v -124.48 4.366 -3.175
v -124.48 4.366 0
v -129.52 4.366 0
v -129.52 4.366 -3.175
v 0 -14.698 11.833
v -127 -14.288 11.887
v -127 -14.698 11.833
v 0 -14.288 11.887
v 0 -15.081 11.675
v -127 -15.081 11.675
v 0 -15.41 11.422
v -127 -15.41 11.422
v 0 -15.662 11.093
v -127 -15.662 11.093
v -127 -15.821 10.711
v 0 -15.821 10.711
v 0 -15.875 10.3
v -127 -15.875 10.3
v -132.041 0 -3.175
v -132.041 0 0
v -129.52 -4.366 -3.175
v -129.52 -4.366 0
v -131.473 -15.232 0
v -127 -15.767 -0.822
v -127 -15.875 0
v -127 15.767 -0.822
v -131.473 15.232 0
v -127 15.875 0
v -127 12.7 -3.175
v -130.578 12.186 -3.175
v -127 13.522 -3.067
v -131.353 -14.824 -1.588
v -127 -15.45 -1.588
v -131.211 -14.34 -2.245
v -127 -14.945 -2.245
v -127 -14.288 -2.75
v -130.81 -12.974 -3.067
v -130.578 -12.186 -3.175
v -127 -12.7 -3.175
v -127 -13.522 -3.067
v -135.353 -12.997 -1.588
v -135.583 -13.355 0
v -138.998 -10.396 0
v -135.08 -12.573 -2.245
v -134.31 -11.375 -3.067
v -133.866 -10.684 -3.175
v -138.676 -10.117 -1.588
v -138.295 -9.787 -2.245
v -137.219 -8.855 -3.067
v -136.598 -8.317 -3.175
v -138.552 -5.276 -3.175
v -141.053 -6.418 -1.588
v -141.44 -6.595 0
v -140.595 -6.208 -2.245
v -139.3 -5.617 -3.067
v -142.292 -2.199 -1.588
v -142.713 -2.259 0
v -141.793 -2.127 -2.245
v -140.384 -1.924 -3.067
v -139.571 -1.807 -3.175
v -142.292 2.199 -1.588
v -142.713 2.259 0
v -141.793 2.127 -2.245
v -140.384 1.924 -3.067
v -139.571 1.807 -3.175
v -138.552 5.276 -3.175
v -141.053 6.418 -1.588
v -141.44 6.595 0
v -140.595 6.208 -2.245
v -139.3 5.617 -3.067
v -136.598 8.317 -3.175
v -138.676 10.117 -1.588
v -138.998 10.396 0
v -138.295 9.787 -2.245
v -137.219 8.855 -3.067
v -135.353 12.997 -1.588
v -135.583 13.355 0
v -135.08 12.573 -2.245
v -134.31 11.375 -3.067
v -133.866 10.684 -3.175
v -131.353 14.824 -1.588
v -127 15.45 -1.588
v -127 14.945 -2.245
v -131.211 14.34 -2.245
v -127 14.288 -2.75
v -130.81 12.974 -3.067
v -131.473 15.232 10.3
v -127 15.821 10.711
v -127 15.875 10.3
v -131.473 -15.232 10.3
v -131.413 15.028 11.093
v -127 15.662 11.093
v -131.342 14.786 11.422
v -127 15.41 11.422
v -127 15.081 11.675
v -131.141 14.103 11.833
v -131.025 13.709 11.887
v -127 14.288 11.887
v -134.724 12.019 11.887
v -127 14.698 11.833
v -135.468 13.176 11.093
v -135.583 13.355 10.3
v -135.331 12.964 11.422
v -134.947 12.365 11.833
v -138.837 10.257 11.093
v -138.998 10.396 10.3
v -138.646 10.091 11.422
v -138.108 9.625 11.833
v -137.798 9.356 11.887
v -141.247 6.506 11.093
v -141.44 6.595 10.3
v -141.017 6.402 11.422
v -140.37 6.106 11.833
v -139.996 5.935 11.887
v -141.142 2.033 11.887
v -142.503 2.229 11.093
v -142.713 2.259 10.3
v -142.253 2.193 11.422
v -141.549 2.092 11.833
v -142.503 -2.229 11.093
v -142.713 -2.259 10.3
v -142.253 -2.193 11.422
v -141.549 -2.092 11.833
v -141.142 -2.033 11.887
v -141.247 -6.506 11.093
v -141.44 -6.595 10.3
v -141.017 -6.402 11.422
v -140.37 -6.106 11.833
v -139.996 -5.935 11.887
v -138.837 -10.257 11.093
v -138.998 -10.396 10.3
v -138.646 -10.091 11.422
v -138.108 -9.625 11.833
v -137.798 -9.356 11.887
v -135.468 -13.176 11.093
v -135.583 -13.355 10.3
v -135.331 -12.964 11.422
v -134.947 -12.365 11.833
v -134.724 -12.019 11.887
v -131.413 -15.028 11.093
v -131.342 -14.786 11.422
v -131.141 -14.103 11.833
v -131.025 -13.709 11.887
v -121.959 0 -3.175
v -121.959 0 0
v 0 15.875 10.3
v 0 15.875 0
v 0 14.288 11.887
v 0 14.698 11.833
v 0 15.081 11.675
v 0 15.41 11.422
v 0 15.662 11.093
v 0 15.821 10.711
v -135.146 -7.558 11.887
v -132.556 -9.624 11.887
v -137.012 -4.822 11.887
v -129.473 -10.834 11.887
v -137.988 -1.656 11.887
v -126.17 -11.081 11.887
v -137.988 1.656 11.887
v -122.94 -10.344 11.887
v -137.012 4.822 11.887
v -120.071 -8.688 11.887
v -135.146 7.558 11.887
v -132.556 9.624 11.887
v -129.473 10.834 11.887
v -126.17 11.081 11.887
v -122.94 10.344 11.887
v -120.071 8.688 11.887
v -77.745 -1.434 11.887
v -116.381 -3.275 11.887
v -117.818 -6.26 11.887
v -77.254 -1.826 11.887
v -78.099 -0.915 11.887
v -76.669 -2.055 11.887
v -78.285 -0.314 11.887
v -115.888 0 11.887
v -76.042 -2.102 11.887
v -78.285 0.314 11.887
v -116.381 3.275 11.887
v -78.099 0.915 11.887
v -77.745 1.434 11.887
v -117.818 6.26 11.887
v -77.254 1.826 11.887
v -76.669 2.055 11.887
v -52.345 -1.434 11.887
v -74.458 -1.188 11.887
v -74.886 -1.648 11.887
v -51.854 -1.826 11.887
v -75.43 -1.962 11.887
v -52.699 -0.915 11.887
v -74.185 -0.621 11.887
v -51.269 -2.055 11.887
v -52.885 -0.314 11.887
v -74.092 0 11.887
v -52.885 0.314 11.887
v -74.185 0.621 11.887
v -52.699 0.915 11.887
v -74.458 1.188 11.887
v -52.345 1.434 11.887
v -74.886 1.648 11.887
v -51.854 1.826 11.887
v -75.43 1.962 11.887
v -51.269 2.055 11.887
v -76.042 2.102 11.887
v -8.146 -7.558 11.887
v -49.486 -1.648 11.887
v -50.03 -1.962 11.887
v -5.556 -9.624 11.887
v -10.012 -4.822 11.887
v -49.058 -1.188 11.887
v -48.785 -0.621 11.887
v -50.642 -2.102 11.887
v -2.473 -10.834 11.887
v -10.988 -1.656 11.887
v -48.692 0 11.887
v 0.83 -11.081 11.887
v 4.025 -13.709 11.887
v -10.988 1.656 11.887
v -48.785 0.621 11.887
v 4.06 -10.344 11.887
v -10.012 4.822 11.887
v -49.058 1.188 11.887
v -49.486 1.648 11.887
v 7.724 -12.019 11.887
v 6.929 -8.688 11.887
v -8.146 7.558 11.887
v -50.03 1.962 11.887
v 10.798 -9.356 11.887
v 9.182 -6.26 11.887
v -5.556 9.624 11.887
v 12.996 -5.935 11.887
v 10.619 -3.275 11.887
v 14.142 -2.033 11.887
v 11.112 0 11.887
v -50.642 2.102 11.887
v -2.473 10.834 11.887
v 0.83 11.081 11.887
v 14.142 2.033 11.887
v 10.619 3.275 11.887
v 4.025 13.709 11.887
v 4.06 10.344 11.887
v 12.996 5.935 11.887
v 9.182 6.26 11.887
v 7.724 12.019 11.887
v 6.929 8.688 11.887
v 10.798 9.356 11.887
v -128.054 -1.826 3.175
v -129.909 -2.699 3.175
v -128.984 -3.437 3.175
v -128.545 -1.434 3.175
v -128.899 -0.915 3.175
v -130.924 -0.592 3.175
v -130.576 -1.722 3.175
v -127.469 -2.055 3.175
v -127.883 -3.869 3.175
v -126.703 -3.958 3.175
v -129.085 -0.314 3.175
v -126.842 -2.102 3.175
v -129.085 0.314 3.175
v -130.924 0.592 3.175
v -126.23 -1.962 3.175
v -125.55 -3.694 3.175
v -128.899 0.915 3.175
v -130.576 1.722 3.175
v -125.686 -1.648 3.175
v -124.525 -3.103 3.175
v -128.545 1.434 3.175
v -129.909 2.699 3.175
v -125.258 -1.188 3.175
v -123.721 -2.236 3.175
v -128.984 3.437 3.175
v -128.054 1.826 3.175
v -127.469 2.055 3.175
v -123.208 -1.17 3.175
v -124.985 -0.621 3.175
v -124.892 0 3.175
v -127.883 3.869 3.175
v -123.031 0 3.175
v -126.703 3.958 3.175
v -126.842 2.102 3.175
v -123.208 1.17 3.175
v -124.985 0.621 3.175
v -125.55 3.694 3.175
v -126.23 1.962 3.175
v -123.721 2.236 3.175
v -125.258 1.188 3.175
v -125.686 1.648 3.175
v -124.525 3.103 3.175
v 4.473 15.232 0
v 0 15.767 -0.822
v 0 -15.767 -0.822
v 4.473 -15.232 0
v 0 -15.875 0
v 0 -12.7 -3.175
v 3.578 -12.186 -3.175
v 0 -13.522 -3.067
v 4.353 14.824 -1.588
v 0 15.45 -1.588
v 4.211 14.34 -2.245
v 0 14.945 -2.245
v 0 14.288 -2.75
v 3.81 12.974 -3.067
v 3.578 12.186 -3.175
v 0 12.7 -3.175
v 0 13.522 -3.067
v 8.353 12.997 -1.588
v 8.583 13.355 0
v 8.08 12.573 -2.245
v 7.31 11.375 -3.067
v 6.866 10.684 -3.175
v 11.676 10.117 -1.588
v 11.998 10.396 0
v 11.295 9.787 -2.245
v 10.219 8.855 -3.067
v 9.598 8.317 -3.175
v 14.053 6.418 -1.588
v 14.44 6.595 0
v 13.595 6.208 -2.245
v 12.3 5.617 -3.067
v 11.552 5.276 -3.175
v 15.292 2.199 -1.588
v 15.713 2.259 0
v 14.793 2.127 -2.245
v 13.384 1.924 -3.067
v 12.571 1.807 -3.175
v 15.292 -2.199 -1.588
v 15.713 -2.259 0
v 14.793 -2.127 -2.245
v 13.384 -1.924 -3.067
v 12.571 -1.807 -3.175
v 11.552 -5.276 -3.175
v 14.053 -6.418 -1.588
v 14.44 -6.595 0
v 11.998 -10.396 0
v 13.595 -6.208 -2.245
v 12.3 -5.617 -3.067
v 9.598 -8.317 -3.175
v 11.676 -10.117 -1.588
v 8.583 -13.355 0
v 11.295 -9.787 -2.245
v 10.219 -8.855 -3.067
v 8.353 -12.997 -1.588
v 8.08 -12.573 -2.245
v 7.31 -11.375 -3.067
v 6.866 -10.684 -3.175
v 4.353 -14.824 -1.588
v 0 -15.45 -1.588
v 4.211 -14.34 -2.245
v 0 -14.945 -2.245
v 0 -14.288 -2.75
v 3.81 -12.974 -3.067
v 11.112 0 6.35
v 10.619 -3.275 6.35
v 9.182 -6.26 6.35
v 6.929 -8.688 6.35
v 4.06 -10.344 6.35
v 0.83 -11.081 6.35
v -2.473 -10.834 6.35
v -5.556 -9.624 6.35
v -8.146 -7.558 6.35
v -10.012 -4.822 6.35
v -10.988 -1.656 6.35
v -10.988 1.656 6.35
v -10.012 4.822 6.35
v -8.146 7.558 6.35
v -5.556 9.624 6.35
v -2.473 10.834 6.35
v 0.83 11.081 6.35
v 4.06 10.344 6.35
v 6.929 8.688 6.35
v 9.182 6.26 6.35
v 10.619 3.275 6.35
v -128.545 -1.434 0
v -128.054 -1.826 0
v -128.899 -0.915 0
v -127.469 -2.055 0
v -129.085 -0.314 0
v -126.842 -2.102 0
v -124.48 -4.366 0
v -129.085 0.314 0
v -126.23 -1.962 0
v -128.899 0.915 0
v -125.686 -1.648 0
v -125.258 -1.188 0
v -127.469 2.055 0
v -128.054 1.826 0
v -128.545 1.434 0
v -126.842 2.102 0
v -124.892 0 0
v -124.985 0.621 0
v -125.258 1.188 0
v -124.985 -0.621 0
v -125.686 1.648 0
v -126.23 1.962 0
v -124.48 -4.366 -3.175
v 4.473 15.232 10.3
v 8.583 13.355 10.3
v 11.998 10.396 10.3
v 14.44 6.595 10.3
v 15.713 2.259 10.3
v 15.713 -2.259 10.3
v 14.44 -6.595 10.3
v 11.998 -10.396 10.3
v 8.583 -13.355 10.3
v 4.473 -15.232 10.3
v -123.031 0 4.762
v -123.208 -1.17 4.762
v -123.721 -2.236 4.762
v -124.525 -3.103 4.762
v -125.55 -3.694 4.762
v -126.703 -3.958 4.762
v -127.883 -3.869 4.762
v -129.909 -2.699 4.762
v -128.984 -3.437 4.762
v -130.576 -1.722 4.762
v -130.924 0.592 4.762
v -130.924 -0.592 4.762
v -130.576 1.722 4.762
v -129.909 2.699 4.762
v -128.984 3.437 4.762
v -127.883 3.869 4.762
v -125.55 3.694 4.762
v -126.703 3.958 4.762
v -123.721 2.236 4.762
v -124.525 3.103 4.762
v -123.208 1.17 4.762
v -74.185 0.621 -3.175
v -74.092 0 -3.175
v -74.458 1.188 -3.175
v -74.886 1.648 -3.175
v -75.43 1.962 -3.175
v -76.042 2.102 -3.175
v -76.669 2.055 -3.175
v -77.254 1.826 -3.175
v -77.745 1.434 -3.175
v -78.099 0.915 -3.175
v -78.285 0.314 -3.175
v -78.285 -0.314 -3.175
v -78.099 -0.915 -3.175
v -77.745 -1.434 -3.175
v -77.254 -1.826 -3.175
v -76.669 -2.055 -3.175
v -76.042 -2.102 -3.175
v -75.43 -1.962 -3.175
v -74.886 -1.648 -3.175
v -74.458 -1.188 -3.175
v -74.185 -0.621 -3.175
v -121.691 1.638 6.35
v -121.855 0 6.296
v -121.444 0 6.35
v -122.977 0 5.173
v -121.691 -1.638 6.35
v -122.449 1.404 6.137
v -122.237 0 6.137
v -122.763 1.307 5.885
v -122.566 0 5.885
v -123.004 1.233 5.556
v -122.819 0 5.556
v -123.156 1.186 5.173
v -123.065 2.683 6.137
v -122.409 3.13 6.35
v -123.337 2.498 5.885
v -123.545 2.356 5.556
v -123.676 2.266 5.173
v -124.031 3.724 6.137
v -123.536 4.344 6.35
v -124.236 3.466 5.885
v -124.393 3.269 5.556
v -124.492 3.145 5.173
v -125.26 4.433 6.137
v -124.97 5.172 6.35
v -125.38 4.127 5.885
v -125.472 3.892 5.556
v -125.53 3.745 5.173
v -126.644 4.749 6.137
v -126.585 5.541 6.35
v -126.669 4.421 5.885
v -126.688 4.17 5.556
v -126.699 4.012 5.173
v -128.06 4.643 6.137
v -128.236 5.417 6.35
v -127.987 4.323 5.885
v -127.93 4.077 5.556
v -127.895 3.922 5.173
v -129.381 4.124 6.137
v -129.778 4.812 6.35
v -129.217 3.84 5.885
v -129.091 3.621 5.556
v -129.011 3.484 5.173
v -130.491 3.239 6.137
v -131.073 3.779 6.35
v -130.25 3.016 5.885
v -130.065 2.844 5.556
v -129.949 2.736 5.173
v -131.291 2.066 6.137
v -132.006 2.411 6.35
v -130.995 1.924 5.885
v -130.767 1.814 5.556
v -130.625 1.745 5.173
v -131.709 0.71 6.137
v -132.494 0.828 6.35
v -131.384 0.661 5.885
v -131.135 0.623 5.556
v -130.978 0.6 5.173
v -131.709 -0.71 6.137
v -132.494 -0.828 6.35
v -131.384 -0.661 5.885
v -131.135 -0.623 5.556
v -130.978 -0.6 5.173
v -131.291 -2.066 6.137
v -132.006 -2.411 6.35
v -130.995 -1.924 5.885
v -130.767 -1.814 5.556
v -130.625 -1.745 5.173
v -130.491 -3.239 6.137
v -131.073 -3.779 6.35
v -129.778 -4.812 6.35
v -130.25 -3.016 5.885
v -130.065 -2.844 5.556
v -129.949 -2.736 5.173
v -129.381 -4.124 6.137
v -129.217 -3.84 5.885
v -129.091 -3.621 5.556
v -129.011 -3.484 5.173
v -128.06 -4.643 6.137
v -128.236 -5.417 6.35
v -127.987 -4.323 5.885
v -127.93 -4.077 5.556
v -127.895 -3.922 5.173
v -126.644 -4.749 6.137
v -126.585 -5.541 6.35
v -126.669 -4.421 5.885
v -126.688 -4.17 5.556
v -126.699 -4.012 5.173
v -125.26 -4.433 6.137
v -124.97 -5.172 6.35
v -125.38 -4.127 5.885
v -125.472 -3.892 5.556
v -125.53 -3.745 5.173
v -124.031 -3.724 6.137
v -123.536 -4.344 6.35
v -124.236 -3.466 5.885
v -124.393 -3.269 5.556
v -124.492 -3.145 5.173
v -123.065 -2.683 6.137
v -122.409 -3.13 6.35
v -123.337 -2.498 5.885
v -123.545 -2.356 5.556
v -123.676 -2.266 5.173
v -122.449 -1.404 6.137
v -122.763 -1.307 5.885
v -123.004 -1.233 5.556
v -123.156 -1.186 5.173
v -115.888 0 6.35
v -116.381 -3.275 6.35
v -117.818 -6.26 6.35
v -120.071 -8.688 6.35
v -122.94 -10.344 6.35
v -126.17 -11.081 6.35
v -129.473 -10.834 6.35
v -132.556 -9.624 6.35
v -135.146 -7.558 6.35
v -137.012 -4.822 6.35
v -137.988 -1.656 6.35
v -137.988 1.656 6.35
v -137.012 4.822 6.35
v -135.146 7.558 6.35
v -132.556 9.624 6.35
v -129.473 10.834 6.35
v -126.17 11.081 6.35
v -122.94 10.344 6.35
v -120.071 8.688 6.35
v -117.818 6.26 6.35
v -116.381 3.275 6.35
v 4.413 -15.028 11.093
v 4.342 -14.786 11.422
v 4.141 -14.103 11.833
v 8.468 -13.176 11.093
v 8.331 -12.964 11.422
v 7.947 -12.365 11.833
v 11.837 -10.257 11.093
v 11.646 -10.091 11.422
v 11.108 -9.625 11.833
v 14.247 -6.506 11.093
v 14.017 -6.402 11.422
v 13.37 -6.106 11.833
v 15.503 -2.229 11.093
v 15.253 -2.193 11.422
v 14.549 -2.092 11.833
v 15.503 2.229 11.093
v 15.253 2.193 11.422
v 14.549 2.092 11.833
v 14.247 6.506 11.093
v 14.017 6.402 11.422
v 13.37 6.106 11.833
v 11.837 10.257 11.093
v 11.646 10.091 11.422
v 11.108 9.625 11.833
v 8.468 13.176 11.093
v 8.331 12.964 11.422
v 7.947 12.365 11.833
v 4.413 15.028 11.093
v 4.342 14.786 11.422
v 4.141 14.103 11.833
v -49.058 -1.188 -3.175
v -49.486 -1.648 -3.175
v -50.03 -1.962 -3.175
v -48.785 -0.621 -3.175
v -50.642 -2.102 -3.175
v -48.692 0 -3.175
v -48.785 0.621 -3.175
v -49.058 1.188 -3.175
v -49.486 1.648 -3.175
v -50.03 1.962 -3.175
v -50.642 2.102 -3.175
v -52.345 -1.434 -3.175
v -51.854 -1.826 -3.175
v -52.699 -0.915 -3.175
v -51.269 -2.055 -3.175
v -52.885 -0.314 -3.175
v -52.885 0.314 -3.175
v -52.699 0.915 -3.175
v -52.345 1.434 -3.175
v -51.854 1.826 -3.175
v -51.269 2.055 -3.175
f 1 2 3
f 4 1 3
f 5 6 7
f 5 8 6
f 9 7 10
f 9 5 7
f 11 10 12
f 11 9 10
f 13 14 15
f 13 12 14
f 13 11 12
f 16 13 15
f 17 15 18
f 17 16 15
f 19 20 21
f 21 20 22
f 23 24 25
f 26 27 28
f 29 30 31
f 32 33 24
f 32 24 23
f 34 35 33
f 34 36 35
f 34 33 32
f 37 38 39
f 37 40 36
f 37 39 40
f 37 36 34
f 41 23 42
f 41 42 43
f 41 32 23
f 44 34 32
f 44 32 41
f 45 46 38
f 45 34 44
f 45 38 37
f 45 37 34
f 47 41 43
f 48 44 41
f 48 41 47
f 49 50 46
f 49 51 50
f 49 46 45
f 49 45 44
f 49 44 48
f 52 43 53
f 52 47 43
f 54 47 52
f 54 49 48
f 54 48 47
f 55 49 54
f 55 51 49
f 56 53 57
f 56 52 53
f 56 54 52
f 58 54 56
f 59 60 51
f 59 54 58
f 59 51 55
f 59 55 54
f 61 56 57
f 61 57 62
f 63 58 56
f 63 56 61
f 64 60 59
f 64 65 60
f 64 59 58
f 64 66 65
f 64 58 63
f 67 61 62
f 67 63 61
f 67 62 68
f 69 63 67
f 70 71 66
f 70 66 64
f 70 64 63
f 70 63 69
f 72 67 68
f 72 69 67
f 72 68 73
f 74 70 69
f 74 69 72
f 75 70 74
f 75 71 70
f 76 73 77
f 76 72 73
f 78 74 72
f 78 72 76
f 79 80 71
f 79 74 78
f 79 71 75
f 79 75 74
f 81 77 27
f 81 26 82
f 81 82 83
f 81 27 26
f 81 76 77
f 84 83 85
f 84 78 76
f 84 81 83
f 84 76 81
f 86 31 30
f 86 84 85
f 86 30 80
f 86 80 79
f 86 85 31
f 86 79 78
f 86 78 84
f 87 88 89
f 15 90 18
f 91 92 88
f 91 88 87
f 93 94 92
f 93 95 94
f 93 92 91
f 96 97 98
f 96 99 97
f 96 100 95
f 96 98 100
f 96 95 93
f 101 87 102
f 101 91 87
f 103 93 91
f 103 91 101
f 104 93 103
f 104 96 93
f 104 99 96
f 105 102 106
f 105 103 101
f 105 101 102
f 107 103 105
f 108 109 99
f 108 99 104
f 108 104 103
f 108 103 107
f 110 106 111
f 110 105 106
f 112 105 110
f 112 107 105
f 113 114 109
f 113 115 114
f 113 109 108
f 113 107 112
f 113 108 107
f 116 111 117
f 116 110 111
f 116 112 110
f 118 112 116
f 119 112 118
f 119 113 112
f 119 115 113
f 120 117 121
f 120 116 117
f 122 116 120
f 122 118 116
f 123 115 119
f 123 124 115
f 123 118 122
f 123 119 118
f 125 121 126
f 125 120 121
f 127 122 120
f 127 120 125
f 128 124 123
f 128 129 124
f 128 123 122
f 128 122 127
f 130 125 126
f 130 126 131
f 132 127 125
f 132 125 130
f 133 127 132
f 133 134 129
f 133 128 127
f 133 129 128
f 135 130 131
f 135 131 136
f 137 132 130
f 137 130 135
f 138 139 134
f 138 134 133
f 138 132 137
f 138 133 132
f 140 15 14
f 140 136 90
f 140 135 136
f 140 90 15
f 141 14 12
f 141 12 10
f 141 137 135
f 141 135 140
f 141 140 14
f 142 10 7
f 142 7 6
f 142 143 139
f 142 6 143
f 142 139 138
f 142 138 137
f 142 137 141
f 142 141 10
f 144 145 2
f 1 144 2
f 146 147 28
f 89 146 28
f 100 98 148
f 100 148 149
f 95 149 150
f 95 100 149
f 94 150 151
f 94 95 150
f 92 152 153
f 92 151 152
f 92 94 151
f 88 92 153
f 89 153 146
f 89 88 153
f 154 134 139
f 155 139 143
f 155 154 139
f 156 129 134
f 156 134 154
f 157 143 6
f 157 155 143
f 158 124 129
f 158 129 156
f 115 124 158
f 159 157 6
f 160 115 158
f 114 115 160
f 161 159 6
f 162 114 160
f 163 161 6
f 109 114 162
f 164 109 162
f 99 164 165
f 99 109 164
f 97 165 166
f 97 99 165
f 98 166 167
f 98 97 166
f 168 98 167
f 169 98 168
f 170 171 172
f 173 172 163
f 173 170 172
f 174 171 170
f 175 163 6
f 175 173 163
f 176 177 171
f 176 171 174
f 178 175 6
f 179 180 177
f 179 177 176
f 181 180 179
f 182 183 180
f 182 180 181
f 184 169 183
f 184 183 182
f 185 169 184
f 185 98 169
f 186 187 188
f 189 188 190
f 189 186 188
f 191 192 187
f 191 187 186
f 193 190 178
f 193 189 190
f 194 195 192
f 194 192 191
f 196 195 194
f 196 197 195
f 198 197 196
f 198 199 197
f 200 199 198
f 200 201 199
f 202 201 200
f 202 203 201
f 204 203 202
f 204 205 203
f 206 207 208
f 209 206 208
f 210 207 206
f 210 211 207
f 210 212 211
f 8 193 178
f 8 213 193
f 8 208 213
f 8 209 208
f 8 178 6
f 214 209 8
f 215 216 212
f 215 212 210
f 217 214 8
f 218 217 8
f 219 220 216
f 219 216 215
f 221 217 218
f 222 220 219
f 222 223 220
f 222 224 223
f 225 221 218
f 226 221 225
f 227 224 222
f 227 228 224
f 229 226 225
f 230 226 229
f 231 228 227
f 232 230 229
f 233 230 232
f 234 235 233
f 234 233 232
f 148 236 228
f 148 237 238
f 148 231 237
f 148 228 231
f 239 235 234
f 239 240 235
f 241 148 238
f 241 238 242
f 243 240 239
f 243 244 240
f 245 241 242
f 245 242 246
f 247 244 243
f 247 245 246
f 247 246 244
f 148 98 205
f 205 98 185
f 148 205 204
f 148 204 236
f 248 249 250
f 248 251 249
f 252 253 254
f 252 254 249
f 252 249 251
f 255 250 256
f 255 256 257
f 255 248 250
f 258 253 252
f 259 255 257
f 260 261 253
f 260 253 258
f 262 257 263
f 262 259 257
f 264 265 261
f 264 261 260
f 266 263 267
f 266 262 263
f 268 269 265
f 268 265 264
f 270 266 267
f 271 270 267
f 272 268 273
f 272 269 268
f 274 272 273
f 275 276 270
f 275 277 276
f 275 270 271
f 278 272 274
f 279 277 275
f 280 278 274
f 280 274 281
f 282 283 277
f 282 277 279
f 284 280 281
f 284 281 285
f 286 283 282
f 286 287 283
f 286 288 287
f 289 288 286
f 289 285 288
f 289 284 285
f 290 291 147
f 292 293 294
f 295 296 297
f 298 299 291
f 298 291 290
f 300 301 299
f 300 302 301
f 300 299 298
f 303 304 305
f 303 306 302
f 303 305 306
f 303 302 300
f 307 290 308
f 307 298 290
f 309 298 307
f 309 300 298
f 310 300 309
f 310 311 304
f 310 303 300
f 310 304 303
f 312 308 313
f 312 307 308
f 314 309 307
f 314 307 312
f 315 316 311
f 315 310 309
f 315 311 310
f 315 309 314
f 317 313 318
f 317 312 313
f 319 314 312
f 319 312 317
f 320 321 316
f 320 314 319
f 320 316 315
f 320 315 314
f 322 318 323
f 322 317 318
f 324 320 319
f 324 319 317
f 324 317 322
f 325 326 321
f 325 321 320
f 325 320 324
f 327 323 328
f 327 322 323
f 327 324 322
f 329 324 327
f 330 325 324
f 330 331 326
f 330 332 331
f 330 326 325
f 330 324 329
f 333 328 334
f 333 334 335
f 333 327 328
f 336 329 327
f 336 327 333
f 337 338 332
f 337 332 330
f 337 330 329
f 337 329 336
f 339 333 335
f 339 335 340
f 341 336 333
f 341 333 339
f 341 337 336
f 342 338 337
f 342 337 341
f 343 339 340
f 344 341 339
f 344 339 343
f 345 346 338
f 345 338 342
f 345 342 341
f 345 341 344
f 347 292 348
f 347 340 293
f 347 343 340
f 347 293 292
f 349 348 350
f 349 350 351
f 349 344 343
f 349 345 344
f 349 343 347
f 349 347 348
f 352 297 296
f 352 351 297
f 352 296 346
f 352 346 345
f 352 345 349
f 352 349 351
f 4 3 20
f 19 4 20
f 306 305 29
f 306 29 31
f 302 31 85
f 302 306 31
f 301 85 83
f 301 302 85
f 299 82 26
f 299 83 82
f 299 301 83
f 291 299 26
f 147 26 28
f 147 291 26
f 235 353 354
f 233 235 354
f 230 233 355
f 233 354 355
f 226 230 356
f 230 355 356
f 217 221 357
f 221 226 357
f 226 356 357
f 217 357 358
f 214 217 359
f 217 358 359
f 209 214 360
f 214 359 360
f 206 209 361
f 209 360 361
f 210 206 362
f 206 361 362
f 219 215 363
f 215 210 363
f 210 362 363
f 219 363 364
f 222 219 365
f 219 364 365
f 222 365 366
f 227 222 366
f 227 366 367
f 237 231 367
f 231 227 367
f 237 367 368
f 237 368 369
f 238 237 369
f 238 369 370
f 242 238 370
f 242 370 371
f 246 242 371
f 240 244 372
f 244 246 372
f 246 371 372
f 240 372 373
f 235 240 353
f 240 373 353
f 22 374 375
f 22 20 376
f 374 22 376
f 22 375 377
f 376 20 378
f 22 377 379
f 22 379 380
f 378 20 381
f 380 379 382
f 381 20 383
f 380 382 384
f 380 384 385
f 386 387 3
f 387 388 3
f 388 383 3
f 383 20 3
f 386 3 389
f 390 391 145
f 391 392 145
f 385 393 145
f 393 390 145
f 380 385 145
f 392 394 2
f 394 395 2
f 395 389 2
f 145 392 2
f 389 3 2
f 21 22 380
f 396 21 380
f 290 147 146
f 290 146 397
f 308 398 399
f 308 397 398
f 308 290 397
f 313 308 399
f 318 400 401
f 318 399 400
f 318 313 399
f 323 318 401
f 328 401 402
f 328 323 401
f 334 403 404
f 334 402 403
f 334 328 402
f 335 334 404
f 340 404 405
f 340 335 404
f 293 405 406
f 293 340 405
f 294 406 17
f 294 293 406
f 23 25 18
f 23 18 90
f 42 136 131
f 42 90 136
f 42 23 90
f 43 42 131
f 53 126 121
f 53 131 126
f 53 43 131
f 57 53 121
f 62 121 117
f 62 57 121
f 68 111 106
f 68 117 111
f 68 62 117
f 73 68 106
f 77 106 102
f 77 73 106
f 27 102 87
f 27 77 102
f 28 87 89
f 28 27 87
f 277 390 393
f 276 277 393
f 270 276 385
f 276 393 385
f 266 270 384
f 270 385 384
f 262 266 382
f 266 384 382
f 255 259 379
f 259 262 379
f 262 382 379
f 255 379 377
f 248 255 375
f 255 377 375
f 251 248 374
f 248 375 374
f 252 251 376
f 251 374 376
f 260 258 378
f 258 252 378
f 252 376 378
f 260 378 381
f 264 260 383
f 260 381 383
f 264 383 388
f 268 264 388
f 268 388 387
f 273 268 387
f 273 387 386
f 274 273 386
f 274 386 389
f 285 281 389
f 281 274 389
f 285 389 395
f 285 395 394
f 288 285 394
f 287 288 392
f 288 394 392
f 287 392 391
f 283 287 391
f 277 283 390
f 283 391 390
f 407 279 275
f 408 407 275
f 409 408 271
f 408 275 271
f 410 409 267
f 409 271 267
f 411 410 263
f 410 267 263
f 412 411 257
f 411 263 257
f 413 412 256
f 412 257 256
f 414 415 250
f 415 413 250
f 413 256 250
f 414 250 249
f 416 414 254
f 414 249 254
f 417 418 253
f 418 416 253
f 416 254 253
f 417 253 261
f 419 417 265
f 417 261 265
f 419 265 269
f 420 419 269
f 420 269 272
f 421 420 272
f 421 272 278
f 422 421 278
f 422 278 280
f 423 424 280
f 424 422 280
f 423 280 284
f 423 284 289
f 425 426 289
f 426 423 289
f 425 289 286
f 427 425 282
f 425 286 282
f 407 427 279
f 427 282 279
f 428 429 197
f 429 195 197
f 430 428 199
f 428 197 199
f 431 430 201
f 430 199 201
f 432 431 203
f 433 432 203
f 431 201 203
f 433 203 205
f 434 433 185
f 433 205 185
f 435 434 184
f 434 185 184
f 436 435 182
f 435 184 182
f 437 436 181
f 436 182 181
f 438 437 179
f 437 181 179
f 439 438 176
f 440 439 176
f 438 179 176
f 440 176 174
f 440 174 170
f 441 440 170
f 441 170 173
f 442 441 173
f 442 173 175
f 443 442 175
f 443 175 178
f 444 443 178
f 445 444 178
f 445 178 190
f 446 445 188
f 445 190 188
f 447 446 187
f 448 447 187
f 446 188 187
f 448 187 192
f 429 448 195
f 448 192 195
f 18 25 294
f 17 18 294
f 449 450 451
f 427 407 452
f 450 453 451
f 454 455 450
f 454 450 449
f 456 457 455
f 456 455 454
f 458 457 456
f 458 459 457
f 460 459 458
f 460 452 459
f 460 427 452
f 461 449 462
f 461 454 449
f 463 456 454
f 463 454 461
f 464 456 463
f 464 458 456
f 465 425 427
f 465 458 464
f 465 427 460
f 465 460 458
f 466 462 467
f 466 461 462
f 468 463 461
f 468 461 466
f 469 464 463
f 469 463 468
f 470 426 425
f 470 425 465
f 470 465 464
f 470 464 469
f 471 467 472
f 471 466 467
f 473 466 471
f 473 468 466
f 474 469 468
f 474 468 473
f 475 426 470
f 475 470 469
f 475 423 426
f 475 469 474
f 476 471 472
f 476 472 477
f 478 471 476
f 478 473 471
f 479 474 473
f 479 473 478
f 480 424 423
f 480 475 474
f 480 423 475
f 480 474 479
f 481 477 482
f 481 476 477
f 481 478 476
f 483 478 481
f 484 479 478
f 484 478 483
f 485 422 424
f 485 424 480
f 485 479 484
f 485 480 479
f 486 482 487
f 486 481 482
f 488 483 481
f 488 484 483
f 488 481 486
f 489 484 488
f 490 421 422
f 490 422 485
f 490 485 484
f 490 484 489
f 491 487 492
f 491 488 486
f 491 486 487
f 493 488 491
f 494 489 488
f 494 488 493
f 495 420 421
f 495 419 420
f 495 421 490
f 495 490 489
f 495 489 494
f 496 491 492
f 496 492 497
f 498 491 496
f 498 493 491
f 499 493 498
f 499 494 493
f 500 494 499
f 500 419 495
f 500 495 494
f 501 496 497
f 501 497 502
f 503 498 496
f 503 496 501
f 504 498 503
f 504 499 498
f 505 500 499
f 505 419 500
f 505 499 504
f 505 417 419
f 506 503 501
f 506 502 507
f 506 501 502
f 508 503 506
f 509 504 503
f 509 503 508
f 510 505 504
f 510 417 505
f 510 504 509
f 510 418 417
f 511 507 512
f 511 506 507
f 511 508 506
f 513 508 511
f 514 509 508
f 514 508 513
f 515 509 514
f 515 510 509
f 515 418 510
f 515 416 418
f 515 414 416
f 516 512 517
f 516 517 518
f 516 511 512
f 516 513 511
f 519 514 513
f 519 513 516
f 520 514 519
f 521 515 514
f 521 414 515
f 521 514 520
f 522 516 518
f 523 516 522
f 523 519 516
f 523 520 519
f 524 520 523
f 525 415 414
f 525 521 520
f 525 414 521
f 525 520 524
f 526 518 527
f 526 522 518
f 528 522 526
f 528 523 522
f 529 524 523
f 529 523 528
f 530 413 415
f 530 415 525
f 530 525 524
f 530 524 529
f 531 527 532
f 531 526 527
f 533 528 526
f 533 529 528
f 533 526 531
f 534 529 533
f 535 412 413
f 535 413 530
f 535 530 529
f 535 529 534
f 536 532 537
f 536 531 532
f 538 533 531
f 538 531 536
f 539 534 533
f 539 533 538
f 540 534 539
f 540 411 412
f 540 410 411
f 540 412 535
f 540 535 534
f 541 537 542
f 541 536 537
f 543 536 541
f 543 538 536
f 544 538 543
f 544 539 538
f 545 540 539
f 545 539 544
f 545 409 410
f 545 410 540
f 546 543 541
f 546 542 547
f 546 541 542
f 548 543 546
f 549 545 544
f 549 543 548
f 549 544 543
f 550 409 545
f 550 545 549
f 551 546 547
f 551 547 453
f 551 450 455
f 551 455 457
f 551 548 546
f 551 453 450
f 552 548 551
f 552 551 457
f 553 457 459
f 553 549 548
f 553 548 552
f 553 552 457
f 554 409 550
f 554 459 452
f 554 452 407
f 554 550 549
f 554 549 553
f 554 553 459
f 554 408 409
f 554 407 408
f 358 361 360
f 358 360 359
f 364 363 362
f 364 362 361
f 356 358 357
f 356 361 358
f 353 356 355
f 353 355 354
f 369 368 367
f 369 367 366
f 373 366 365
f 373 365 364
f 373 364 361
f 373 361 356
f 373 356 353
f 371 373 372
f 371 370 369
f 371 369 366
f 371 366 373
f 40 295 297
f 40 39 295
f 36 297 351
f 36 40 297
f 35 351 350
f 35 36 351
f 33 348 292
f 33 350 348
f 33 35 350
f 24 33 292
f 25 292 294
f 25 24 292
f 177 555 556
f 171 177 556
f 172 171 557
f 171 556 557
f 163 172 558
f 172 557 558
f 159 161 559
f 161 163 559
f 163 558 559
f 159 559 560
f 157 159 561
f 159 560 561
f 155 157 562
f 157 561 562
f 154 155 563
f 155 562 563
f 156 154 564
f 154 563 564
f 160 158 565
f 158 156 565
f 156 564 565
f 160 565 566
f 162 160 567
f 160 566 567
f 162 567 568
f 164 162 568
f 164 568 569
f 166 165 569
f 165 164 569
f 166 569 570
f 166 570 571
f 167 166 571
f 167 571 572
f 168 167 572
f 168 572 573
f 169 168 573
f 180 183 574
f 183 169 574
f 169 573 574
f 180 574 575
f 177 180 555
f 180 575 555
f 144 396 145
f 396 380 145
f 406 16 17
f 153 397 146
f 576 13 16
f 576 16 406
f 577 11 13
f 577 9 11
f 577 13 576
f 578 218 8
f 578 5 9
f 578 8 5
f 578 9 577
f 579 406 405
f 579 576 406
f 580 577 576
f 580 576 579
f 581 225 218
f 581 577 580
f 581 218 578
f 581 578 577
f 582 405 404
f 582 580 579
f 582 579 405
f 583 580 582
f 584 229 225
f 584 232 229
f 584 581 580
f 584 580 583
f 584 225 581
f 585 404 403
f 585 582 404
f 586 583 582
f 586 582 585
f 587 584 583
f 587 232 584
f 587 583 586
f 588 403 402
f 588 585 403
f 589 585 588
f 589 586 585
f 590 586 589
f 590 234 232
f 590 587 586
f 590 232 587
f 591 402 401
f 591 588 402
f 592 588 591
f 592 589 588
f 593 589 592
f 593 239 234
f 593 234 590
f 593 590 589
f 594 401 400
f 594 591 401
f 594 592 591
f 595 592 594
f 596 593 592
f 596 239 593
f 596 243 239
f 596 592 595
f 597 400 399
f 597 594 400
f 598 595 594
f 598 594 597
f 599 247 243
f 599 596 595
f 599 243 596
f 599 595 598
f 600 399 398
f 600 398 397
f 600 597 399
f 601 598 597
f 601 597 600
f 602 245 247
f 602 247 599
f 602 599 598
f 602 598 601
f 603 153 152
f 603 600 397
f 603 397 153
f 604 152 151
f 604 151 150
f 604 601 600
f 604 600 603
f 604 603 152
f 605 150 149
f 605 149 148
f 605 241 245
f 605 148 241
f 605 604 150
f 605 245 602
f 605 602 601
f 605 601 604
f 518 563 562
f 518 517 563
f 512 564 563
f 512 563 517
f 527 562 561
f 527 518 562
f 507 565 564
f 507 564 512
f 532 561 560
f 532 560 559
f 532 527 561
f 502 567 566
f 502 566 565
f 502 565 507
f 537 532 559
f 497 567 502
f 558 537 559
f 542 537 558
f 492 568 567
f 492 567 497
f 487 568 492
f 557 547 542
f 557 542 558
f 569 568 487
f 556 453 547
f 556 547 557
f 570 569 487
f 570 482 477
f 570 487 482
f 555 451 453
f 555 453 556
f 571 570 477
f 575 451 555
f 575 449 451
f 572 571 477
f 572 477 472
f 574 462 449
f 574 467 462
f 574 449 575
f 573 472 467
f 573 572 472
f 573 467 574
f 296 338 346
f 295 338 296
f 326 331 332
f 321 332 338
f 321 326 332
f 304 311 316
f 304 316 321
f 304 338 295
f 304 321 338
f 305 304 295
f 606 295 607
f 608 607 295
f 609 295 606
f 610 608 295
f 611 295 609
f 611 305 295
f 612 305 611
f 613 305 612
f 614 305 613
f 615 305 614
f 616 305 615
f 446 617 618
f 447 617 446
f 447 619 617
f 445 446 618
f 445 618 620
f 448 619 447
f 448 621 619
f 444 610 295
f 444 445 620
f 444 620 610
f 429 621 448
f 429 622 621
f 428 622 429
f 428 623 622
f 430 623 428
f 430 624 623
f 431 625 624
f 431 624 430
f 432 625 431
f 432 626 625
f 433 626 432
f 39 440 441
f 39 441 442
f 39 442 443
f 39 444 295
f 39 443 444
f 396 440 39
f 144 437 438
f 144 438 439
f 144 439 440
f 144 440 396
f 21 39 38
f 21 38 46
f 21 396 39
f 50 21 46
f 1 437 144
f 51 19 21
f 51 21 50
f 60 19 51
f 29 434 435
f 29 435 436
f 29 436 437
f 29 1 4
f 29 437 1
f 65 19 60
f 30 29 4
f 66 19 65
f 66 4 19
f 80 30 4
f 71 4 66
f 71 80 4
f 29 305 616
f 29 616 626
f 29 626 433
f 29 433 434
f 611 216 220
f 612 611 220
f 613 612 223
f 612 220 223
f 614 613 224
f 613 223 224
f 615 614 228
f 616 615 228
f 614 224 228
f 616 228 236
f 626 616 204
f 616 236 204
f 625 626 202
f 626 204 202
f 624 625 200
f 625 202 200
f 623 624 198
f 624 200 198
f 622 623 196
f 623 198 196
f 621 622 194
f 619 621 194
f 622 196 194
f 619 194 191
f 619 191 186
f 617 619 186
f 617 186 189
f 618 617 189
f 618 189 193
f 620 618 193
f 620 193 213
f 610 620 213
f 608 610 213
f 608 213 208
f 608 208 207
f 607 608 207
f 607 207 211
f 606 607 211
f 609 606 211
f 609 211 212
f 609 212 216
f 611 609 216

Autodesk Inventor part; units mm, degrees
ref_plane "YZ Plane" through (0, 0, 0) normal (1, 0, 0) x (0, 1, 0)
ref_plane "XZ Plane" through (0, 0, 0) normal (0, 1, 0) x (-1, 0, 0)
ref_plane "XY Plane" through (0, 0, 0) normal (0, 0, 1) x (1, 0, 0)
sketch "Sketch1" plane through (0, 0, 0) normal (0, 0, 1) x (1, 0, 0)
  circle A0 centre (0, 0) radius 15.875
  line L0 (0, 0) -> (-127, 0)
  circle A1 centre (-127, 0) radius 15.875
  line L1 (-127, 15.875) -> (0, 15.875)
  line L2 (0, -15.875) -> (-127, -15.875)
  circle A2 centre (-127, 0) radius 2.1082
  dimension "d0" = 31.75
  dimension "d1" = 127
  dimension "d2" = 31.75
  dimension "d3" = 4.2164
extrude "Extrusion1" add sketch "Sketch1" along normal blind 3.175
sketch "Sketch2" plane through (0, 0, 0) normal (0, 0, -1) x (-1, 0, 0)
  arc A0 (127, -15.875) -> (127, 15.875) centre (127, 0) ccw projected
  line L0 (0, 15.875) -> (127, 15.875) projected
  arc A1 (0, 15.875) -> (0, -15.875) centre (0, 0) ccw projected
  line L1 (127, -15.875) -> (0, -15.875) projected
  circle A2 centre (127, 0) radius 2.1082 projected
  line L2 (121.959, 0) -> (124.4795, 4.3656)
  line L3 (124.4795, 4.3656) -> (129.5205, 4.3656)
  line L4 (129.5205, 4.3656) -> (132.041, 0)
  line L5 (132.041, 0) -> (129.5205, -4.3656)
  line L6 (129.5205, -4.3656) -> (124.4795, -4.3656)
  line L7 (124.4795, -4.3656) -> (121.959, 0)
  dimension "d6" = 4.3656
extrude "Extrusion2" add sketch "Sketch2" along normal blind 3.175 contours L1 A1 L0 A0
fillet "Fillet1" radius 3.175 4 edges at (15.875, 0, -3.175) (-63.5, -15.875, -3.175) (-142.875, 0, -3.175) (-63.5, 15.875, -3.175)
sketch "Sketch3" plane through (0, 0, 3.175) normal (0, 0, 1) x (1, 0, 0)
  arc A0 (-127, 15.875) -> (-127, -15.875) centre (-127, 0) ccw projected
  line L0 (-127, -15.875) -> (0, -15.875) projected
  arc A1 (0, -15.875) -> (0, 15.875) centre (0, 0) ccw projected
  line L1 (0, 15.875) -> (-127, 15.875) projected
  circle A2 centre (-127, 0) radius 2.1082 projected
  circle A3 centre (-127, 0) radius 3.9688
  dimension "d10" = 7.9375
extrude "Extrusion3" add sketch "Sketch3" along normal blind 3.175 contours L1 A1 L0 A0
sketch "Sketch4" plane through (0, 0, 6.35) normal (0, 0, 1) x (1, 0, 0)
  line L0 (-127, -15.875) -> (0, -15.875) projected
  arc A0 (0, -15.875) -> (0, 15.875) centre (0, 0) ccw projected
  line L1 (0, 15.875) -> (-127, 15.875) projected
  arc A1 (-127, 15.875) -> (-127, -15.875) centre (-127, 0) ccw projected
  circle A2 centre (-127, 0) radius 3.9688 projected
  circle A3 centre (-127, 0) radius 2.1082 projected
  circle A4 centre (-127, 0) radius 11.1125
  circle A5 centre (0, 0) radius 11.1125
  dimension "d13" = 22.225
  dimension "d14" = 22.225
extrude "Extrusion4" add sketch "Sketch4" along normal blind 5.5372 contours A1 L1 A0 L0
sketch "Sketch5" plane through (0, 0, 11.8872) normal (0, 0, 1) x (1, 0, 0)
  circle A0 centre (-76.2, 0) radius 2.1082
  circle A1 centre (-50.8, 0) radius 2.1082
  circle A2 centre (-127, 0) radius 2.1082 projected
  point P0 (0, 0)
  dimension "d17" = 4.2164
  dimension "d18" = 4.2164
  dimension "d19" = 50.8
  dimension "d20" = 50.8
extrude "Extrusion5" cut sketch "Sketch5" against normal blind 25.4 contours A0 | A1
fillet "Fillet2" radius 1.5875 4 edges at (-142.875, 0, 11.8872) (-63.5, -15.875, 11.8872) (15.875, 0, 11.8872) (-63.5, 15.875, 11.8872)
fillet "Fillet3" radius 1.5875 1 edges at (-130.9688, 0, 6.35)
properties part number "Plate E"
